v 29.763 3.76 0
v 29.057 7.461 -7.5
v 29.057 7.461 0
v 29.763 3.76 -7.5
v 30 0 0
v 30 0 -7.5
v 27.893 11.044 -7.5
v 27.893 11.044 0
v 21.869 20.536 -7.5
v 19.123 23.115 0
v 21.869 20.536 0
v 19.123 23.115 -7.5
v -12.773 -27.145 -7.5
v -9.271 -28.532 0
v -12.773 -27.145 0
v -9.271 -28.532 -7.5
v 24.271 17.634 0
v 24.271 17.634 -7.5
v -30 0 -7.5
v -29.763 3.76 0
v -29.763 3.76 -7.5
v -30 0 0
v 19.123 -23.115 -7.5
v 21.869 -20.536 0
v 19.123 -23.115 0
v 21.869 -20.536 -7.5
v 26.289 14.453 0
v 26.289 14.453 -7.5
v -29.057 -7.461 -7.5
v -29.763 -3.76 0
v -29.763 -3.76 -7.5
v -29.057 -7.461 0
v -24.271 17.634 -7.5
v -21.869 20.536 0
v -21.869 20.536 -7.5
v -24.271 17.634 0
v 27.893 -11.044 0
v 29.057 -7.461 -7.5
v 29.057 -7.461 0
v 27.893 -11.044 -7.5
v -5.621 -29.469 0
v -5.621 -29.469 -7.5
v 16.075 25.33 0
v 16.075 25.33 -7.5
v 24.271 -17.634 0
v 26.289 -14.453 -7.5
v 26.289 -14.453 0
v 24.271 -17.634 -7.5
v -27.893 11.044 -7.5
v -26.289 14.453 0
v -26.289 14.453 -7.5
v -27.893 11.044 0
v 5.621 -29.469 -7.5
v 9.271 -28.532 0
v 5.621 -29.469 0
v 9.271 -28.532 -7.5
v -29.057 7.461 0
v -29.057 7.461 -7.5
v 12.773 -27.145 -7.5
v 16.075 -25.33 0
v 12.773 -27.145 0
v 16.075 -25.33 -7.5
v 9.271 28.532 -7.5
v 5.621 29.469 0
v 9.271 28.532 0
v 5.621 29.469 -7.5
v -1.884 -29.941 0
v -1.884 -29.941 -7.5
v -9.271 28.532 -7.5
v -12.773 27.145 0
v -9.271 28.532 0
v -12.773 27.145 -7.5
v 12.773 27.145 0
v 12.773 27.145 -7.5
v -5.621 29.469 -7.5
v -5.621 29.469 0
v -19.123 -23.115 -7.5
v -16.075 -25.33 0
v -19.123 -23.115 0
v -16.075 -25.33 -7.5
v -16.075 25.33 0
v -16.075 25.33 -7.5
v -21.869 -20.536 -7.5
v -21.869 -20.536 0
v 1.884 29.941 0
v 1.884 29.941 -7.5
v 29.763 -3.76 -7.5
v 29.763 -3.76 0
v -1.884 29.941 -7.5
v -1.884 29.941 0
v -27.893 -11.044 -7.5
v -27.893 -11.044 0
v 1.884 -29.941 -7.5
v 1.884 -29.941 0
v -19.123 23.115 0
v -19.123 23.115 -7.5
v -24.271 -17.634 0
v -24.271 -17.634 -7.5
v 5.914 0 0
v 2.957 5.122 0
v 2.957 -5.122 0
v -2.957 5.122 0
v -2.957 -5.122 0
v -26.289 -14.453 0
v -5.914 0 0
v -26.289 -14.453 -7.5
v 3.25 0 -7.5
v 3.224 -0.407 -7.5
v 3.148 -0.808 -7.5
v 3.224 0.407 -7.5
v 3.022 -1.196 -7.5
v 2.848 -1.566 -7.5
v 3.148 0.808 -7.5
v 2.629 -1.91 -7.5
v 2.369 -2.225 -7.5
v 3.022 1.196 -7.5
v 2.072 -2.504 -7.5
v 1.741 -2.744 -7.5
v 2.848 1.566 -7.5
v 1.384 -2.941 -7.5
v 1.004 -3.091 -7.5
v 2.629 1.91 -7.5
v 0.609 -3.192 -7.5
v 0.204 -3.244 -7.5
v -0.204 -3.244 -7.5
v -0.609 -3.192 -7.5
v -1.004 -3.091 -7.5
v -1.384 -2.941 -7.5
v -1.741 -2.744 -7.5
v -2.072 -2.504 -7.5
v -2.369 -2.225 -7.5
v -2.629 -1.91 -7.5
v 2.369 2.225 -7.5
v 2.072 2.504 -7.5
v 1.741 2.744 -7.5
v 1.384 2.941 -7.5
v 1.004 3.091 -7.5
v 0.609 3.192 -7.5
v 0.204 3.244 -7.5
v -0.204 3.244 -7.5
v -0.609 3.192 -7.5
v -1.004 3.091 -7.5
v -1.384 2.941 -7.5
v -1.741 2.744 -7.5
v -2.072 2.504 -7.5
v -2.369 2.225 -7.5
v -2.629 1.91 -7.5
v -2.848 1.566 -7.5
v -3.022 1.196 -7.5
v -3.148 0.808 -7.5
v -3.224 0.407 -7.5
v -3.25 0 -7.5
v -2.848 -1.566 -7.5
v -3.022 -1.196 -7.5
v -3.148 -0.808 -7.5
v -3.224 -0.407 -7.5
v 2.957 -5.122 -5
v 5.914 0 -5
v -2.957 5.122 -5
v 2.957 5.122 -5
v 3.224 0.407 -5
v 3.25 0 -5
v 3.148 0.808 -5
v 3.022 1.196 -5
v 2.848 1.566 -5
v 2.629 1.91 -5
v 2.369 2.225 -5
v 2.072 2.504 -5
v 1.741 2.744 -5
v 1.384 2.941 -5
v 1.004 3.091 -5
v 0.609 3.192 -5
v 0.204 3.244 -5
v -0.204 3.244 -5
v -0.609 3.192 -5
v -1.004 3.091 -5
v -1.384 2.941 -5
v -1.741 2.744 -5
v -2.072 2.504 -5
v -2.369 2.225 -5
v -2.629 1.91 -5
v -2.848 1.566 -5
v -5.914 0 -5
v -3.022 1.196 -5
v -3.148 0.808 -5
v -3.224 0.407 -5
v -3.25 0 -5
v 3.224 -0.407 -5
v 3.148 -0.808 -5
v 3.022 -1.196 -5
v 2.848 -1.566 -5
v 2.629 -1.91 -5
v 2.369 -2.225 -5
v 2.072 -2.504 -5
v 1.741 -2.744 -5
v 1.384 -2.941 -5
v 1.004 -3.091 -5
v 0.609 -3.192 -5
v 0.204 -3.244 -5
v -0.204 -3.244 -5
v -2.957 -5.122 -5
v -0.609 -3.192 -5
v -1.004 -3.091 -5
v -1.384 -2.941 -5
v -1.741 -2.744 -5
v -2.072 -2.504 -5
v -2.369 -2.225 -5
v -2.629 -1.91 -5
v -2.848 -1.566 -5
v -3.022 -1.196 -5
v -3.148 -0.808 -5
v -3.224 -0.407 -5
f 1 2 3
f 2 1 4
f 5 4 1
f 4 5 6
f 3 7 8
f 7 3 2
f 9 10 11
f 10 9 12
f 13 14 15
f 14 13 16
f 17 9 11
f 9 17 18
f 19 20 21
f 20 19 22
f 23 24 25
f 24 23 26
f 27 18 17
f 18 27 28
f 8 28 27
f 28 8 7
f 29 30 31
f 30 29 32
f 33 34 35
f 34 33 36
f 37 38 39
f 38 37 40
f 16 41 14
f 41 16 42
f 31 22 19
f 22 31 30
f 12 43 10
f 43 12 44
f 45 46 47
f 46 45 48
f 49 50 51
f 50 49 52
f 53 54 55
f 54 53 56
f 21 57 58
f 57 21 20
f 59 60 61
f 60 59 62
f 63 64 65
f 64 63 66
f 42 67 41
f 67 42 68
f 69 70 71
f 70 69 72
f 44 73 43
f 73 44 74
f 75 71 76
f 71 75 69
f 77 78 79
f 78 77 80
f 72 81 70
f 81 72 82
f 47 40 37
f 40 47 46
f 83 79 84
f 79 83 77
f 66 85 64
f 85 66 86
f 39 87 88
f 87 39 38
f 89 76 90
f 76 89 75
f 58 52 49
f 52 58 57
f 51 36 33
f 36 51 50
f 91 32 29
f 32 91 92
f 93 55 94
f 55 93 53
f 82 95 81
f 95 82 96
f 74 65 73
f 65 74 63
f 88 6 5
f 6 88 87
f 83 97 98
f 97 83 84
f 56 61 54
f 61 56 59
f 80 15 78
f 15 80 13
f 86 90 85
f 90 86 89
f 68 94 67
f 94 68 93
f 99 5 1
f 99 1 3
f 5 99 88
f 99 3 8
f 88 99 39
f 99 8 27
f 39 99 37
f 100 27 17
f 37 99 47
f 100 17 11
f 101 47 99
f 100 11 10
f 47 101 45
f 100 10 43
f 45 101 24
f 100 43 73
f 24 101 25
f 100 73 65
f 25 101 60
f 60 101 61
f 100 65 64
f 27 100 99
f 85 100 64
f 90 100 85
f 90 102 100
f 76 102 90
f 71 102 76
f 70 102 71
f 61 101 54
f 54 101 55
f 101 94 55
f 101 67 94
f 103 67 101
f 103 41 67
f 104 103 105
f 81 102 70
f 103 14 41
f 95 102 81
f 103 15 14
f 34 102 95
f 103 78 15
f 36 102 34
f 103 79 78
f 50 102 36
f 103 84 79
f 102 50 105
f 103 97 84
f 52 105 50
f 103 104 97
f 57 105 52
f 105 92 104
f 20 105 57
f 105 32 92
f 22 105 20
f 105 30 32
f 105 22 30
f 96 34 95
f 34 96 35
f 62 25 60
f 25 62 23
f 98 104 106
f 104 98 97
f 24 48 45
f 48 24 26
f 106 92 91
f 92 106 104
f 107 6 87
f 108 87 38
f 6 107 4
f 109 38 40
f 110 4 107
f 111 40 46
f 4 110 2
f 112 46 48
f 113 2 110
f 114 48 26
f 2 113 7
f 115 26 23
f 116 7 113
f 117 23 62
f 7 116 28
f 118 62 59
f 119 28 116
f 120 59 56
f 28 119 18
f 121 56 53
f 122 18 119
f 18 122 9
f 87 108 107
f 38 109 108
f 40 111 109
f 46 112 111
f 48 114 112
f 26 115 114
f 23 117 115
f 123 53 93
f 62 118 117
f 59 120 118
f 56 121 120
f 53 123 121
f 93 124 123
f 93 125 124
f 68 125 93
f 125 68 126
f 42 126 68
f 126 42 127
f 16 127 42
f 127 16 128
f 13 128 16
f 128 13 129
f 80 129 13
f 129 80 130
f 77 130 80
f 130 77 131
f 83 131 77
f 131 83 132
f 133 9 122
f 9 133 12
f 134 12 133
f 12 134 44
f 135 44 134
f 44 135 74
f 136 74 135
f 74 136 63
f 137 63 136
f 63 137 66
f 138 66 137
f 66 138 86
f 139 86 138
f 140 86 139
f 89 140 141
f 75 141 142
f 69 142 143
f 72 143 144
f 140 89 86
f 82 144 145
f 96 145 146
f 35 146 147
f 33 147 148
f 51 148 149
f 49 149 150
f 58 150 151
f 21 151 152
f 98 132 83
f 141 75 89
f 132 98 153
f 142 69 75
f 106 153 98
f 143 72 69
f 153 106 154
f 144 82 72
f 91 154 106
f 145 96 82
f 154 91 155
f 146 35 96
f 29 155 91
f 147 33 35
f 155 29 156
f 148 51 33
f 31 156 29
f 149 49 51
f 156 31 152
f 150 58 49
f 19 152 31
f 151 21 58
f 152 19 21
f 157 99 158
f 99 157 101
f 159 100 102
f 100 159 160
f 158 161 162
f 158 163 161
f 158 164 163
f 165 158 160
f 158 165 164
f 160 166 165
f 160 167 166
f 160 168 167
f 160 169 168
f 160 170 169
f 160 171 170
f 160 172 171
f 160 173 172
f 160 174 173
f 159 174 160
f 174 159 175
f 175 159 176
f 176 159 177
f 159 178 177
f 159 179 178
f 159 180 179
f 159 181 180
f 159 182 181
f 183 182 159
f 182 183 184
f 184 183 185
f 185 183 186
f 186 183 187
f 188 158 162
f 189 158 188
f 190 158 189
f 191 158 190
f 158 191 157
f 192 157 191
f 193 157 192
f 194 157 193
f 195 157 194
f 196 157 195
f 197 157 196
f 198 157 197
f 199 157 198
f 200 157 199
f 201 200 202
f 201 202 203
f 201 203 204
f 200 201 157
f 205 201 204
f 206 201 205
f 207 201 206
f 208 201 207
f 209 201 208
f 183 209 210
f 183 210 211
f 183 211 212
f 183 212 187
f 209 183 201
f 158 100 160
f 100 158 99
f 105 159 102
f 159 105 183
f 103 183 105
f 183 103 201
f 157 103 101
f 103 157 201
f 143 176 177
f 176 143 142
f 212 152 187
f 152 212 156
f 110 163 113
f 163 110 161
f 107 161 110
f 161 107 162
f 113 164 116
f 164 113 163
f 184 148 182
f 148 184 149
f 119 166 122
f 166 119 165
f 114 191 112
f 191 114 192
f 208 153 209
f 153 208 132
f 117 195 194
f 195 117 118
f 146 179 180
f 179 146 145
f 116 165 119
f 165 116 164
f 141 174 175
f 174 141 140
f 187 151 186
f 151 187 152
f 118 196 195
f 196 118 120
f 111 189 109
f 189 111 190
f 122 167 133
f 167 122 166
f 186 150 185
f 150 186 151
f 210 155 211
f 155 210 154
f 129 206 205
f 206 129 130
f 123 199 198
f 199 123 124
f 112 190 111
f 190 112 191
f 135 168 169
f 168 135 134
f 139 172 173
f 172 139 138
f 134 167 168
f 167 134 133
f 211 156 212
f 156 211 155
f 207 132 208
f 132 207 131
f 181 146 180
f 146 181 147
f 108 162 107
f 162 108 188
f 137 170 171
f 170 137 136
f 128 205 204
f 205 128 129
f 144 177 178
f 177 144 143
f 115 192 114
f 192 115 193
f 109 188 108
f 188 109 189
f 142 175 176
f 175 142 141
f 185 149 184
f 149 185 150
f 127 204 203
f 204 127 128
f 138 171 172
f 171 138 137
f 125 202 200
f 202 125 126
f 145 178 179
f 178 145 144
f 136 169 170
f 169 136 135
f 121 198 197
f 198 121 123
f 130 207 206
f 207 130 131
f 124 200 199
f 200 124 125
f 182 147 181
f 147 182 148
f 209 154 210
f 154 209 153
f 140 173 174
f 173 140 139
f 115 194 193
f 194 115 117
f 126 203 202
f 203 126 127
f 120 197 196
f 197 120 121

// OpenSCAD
$fn = 50;

difference() {
	union() {
		translate(v = [0, 0, -7.5]) {
			cylinder(h = 7.5, r = 30.0);
		}
		#translate(v = [0, 0, -9.0]) {
			cylinder(h = 9, r = 2.875);
		}
	}
	union() {
		translate(v = [0, 0, 0]) {
			rotate(a = [0, 0, 0]) {
				difference() {
					union() {
						translate(v = [0, 0, -5]) {
							linear_extrude(height = 5) {
								polygon(points = [[5.914249999999999, 0.0], [2.957125, 5.1218907443321156], [-2.9571249999999982, 5.1218907443321156], [-5.914249999999999, 7.242867331857232e-16], [-2.9571250000000022, -5.121890744332115], [2.9571249999999956, -5.121890744332118]]);
							}
						}
					}
					union();
				}
			}
		}
		#translate(v = [0, 0, -100.0]) {
			cylinder(h = 200, r = 3.25);
		}
	}
}
